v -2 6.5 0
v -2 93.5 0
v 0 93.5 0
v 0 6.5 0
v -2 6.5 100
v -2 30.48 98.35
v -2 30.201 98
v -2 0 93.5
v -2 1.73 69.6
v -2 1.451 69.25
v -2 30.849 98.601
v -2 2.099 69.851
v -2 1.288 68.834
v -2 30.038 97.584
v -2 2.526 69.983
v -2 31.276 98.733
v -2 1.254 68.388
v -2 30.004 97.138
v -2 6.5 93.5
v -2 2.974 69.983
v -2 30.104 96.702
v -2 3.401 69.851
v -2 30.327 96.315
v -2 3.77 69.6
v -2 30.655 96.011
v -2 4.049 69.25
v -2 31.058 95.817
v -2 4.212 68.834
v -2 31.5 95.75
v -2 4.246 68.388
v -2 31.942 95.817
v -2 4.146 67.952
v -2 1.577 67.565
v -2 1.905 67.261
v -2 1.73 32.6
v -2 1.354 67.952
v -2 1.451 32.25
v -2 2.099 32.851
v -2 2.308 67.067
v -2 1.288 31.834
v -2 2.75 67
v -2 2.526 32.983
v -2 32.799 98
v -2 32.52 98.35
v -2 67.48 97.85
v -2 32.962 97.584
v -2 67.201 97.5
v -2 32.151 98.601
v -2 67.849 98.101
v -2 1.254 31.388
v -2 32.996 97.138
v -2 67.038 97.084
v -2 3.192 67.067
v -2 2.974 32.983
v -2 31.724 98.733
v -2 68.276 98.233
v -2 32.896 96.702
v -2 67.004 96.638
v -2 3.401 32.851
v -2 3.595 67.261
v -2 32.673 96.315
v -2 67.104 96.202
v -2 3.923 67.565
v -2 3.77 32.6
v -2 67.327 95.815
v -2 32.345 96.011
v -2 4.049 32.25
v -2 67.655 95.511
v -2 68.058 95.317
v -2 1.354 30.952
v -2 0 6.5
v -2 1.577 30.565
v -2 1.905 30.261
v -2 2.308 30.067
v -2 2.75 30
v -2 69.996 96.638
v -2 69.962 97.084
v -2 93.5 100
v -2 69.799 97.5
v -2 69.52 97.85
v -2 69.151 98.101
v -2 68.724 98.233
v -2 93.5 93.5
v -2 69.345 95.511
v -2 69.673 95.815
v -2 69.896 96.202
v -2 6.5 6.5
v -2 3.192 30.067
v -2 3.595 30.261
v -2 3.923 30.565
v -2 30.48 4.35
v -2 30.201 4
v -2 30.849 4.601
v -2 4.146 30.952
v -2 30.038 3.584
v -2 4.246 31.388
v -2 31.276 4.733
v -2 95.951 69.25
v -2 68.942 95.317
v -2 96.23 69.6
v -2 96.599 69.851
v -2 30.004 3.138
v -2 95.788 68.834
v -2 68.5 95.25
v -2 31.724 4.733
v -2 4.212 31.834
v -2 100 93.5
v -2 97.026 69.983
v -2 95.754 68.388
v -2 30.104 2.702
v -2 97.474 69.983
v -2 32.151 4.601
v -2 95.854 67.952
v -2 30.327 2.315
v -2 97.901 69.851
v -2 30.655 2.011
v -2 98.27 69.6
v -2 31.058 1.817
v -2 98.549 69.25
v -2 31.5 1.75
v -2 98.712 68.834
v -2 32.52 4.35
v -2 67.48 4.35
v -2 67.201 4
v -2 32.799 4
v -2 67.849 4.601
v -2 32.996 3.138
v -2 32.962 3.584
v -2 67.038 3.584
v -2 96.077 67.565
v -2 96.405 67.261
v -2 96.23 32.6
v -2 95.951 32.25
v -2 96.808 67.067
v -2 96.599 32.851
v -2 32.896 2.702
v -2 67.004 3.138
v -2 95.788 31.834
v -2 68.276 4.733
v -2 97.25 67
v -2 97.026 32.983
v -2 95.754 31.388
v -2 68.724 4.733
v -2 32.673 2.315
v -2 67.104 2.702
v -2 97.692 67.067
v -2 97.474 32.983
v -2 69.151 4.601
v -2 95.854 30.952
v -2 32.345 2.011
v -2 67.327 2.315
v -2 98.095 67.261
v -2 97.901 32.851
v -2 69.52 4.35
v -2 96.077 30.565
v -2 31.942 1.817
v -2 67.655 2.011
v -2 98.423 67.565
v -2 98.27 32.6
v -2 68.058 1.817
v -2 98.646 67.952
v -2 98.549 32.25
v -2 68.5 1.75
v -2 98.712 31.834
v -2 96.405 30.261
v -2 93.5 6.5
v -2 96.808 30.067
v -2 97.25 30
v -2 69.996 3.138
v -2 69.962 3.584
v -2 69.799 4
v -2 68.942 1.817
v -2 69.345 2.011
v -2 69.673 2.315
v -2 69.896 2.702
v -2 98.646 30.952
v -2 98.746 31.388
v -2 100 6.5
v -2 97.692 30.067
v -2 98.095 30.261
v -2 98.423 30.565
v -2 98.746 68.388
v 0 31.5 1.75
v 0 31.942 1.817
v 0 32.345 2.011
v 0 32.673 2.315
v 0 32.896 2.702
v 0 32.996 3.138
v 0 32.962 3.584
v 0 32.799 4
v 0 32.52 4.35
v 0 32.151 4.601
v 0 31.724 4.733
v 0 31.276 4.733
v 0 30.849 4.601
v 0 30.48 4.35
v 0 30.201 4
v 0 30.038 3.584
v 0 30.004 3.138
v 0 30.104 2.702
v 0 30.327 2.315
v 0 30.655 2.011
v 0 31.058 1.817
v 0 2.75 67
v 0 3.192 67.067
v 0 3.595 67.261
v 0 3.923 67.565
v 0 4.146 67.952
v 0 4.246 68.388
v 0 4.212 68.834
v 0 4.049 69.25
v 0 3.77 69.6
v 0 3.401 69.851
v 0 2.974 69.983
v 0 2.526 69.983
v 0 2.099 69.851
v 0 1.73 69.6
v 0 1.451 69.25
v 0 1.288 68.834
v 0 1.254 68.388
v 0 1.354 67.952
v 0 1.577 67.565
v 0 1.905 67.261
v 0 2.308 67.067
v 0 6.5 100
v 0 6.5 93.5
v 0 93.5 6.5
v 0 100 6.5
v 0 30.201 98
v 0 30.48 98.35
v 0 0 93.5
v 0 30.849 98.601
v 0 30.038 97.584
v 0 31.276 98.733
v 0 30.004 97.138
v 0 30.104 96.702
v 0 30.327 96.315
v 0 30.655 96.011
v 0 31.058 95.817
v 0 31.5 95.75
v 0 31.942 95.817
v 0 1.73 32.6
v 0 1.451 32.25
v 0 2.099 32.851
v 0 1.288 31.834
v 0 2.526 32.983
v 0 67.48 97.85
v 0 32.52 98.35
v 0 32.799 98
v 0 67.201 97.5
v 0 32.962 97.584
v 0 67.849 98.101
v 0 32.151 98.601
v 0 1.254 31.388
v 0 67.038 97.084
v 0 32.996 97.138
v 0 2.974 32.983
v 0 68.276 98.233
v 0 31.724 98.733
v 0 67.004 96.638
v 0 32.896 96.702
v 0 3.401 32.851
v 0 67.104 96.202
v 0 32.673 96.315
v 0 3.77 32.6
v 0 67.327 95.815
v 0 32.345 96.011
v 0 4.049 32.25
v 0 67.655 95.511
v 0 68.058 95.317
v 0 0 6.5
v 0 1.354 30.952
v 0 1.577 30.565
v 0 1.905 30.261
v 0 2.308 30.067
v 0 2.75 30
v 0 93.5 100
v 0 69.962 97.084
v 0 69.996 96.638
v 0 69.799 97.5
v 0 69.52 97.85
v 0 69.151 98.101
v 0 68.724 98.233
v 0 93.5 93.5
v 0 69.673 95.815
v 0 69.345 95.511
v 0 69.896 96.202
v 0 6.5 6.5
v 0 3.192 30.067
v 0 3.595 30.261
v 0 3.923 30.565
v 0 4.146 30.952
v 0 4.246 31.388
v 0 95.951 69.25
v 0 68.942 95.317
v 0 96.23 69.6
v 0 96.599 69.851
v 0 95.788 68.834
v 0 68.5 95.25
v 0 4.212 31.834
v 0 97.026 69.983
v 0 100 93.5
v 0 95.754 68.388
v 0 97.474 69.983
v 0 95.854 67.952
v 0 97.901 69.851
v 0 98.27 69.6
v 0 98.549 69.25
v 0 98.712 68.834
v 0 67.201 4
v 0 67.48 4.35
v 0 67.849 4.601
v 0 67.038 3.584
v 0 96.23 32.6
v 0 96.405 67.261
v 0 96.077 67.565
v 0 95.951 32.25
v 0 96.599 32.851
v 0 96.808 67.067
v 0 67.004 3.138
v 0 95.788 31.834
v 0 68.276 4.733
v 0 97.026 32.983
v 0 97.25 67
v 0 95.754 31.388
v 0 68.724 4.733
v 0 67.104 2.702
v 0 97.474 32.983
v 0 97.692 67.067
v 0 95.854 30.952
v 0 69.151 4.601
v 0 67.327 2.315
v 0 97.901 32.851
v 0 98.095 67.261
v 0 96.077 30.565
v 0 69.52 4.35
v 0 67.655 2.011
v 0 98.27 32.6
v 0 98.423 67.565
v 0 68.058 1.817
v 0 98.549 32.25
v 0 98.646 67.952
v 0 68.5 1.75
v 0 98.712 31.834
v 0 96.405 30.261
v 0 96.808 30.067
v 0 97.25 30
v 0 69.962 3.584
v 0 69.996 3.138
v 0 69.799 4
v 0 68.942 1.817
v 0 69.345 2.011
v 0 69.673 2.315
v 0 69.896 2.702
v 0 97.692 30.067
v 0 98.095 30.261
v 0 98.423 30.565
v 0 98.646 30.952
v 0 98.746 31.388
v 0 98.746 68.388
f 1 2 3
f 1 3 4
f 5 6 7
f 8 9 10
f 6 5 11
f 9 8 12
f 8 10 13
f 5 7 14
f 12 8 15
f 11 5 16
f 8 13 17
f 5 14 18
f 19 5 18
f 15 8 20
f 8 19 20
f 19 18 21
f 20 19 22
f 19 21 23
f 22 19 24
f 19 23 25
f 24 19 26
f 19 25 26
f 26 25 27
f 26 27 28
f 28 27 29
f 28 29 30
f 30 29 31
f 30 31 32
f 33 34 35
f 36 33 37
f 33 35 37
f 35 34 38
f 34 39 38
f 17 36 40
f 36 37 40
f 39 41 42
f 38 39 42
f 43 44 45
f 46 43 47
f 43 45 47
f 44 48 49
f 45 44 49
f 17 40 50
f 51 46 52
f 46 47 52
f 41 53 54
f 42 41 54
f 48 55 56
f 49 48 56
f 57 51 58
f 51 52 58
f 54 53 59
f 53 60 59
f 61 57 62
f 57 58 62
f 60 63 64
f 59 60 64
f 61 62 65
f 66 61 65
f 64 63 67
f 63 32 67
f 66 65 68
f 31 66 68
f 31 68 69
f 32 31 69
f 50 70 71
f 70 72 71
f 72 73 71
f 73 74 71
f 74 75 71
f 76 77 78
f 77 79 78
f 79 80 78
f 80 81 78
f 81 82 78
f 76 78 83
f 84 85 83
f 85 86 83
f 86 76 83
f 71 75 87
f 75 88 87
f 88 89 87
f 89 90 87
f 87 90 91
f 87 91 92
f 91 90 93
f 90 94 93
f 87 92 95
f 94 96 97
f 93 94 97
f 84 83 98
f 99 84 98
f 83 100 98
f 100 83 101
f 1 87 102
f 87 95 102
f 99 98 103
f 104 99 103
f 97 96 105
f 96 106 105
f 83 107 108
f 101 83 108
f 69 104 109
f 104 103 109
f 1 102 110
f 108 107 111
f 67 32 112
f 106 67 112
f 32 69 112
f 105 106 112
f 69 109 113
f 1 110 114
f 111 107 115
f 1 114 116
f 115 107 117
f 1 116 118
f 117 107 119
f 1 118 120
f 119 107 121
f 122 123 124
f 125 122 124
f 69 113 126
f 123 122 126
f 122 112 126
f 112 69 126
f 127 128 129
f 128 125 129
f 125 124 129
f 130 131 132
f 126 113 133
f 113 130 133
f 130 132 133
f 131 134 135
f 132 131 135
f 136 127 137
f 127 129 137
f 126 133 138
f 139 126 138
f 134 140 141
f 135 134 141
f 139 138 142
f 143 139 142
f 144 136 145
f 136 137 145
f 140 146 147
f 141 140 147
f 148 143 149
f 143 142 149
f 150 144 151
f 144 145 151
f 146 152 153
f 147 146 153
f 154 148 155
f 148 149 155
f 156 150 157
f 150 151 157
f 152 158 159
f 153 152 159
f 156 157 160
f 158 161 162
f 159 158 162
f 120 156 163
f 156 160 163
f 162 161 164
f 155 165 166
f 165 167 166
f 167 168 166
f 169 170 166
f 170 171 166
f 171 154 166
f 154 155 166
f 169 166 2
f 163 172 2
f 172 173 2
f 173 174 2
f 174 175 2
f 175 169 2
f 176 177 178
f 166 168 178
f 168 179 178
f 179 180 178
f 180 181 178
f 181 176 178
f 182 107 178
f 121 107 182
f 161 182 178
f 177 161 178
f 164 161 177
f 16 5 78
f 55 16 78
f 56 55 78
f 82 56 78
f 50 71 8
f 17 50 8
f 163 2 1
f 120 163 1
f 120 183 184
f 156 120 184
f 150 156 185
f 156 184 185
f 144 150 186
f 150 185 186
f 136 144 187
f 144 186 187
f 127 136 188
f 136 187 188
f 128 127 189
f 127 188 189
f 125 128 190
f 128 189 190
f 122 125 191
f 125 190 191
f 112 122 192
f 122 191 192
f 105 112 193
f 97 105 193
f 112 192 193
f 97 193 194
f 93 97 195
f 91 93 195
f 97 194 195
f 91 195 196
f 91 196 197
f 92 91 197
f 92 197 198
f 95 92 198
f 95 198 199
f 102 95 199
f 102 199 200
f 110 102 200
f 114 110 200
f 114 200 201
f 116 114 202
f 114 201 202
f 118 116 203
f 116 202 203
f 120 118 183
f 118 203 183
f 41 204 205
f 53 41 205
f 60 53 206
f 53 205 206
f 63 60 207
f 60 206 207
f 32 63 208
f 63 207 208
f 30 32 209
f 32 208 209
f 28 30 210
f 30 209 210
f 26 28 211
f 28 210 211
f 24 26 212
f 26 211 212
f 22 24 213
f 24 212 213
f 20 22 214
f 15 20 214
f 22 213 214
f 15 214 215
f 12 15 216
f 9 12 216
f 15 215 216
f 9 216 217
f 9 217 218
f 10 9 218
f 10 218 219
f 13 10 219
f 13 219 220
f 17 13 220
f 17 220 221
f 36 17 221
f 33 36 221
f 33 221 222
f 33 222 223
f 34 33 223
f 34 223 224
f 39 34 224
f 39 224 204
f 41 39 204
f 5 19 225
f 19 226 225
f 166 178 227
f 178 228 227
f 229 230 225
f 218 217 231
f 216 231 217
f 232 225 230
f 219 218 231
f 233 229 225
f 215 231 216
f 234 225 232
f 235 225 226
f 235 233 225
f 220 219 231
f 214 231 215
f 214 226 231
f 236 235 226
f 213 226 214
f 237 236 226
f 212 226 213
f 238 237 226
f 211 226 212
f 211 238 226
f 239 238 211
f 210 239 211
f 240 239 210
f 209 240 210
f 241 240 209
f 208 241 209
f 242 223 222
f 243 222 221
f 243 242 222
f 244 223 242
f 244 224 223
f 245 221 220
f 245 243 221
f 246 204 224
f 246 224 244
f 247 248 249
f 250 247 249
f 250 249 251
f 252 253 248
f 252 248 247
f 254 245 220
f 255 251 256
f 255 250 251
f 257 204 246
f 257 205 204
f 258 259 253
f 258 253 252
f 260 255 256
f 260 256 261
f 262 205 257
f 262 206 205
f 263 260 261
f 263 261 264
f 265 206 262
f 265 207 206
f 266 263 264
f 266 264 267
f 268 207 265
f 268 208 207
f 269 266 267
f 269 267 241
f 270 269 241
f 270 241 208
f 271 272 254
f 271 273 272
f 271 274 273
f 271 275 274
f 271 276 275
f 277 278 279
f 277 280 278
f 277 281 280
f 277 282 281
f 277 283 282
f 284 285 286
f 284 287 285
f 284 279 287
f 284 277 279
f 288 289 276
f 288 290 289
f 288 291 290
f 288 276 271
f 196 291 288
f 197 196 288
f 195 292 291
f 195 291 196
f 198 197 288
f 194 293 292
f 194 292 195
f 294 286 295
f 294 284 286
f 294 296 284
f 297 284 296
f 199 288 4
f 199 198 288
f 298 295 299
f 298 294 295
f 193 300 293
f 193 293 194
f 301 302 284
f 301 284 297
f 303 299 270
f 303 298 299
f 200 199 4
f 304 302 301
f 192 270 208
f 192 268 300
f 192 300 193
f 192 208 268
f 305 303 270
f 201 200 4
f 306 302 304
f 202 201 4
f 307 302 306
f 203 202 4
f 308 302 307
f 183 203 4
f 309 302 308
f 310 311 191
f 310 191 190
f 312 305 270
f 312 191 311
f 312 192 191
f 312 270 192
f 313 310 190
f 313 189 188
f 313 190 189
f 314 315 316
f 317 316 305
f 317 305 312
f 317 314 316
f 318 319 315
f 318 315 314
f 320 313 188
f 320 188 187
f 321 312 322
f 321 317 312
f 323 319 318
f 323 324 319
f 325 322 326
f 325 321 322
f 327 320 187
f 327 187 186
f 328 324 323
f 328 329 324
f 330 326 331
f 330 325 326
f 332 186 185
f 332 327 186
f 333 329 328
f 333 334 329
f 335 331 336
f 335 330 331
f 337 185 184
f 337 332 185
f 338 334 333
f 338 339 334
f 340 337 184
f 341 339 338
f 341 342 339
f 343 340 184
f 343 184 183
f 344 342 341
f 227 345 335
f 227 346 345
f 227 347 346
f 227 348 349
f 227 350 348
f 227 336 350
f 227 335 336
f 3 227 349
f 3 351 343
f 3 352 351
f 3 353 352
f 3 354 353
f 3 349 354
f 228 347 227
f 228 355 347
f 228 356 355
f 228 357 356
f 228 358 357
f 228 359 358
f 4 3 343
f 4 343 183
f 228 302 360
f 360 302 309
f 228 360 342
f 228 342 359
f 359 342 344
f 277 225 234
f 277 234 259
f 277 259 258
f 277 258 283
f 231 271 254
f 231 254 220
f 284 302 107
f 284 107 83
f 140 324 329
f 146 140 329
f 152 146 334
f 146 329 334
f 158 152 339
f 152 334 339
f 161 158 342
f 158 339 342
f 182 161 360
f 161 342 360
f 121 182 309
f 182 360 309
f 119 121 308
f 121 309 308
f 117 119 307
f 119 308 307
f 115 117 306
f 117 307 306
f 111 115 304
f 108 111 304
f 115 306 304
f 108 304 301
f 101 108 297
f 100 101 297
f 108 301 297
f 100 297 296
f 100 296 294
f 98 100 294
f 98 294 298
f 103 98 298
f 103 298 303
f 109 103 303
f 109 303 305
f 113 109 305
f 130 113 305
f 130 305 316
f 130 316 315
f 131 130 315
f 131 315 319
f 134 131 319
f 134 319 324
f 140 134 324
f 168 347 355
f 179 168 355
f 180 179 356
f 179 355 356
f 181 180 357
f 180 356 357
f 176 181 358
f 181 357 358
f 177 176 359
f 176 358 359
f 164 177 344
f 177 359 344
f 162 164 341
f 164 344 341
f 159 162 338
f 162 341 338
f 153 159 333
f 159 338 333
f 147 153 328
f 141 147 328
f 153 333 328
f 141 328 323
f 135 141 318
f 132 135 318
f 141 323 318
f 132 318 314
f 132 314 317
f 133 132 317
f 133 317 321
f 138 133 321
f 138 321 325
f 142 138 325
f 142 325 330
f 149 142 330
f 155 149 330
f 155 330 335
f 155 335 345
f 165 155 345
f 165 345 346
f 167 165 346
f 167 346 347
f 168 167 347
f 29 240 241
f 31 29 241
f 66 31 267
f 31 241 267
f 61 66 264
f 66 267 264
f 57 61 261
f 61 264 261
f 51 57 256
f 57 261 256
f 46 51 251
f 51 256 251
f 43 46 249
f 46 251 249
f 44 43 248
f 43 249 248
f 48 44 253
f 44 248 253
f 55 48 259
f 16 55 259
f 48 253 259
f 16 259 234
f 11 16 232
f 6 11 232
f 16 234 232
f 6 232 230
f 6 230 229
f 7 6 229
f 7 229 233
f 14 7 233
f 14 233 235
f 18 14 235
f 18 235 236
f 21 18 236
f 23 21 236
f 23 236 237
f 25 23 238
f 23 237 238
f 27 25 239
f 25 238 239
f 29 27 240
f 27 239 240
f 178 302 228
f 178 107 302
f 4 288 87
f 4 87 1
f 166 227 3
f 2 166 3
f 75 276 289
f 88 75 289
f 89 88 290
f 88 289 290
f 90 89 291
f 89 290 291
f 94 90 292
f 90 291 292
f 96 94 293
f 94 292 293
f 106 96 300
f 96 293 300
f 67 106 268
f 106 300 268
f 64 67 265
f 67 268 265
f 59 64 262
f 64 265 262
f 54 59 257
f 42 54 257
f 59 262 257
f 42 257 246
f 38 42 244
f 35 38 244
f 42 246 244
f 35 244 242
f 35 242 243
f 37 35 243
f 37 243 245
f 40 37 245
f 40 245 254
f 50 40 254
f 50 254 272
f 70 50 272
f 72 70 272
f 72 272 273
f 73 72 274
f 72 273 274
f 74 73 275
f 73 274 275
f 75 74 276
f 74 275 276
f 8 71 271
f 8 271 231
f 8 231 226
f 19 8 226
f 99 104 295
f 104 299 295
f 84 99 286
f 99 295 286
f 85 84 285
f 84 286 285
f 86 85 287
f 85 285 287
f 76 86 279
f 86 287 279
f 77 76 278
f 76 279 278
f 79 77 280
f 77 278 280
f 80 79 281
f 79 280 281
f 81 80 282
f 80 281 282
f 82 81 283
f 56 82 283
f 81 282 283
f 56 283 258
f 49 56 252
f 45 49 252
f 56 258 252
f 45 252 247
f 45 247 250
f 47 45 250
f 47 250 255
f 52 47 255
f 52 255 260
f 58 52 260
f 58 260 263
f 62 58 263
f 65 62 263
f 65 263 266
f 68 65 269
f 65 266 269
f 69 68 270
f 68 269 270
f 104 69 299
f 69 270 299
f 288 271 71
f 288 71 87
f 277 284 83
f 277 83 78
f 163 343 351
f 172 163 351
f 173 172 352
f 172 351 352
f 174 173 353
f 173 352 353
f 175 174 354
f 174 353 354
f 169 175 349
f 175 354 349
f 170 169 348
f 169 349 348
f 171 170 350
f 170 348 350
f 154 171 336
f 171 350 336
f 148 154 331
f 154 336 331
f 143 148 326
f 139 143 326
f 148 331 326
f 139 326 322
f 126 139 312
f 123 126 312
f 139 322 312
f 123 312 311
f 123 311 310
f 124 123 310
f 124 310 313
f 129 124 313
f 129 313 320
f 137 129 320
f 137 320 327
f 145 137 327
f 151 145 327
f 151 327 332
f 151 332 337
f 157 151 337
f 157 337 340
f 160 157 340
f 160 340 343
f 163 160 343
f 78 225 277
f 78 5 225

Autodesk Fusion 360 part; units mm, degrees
sketch "Sketch1" plane through (0, 0, 0) normal (1, 0, 0) x (0, 0, -1)
  line L0 (0, 0) -> (-100, 0)
  line L1 (-100, 0) -> (-100, 100)
  line L2 (-100, 100) -> (0, 100)
  line L3 (0, 100) -> (0, 0)
  dimension "d1" = 100
  dimension "d2" = 100
extrude "Extrude1" add sketch "Sketch1" against normal blind 2
extrude "Extrude2" add 1 faces at (0, 33.3333, 33.3333) along direction (1, 0, 0) blind 2
extrude "Extrude3" add 1 faces at (2, 33.3333, 33.3333) along direction (1, 0, 0) blind 1
sketch "Sketch2" plane through (3, 0, 0) normal (1, 0, 0) x (0, 0, -1)
  line L0 (-100, 100) -> (0, 100)
  line L1 (0, 100) -> (0, 0)
  line L2 (0, 0) -> (-100, 0)
  line L3 (-100, 0) -> (-100, 100)
  line L4 (-100, 100) -> (-68.5, 100)
  line L5 (-68.5, 100) -> (-68.5, 94.5)
  line L6 (-68.5, 94.5) -> (-100, 94.5)
  line L7 (-100, 94.5) -> (-100, 100)
  line L8 (-100, 100) -> (-93.5, 100)
  line L9 (-93.5, 100) -> (-93.5, 68.5)
  line L10 (0, 100) -> (-6.5, 100)
  line L11 (-6.5, 100) -> (-6.5, 68.5)
  line L12 (-6.5, 68.5) -> (0, 68.5)
  line L13 (0, 68.5) -> (0, 100)
  line L14 (0, 100) -> (-31.5, 100)
  line L15 (-31.5, 100) -> (-31.5, 94.5)
  line L16 (-31.5, 94.5) -> (0, 94.5)
  line L17 (0, 94.5) -> (0, 100)
  line L18 (0, 0) -> (-6.5, 0)
  line L19 (-6.5, 0) -> (-6.5, 31.5)
  line L20 (-6.5, 31.5) -> (0, 31.5)
  line L21 (0, 31.5) -> (0, 0)
  line L22 (0, 0) -> (-31.5, 0)
  line L23 (-31.5, 0) -> (-31.5, 5.5)
  line L24 (-31.5, 5.5) -> (0, 5.5)
  line L25 (0, 5.5) -> (0, 0)
  line L26 (-100, 0) -> (-68.5, 0)
  line L27 (-68.5, 0) -> (-68.5, 5.5)
  line L28 (-68.5, 5.5) -> (-100, 5.5)
  line L29 (-100, 5.5) -> (-100, 0)
  line L30 (-100, 0) -> (-94.5, 0)
  line L31 (-94.5, 0) -> (-94.5, 31.5)
  line L32 (-94.5, 31.5) -> (-100, 31.5)
  line L33 (-100, 31.5) -> (-100, 0)
  circle A0 centre (-68.5, 97.25) radius 1.5
  circle A1 centre (-97.25, 31.5) radius 1.5
  circle A2 centre (-68.5, 2.75) radius 1.5
  circle A3 centre (-31.5, 2.75) radius 1.5
  circle A4 centre (-3.25, 31.5) radius 1.5
  circle A5 centre (-3.25, 68.5) radius 1.5
  circle A6 centre (-31.5, 97.25) radius 1.5
  line L34 (-93.5, 68.5) -> (-100, 68.5)
  line L35 (-100, 68.5) -> (-100, 100)
  line L36 (-100, 100) -> (-93.5, 100)
  line L37 (-93.5, 100) -> (-93.5, 68.5)
  circle A7 centre (-96.75, 68.5) radius 1.5
  line L38 (-100, 100) -> (-93.5, 100)
  line L39 (-93.5, 100) -> (-93.5, 93.5)
  line L40 (-93.5, 93.5) -> (-100, 93.5)
  line L41 (-100, 93.5) -> (-100, 100)
  line L42 (-100, 0) -> (-93.5, 0)
  line L43 (-93.5, 0) -> (-93.5, 6.5)
  line L44 (-93.5, 6.5) -> (-100, 6.5)
  line L45 (-100, 6.5) -> (-100, 0)
  line L46 (0, 0) -> (-6.5, 0)
  line L47 (-6.5, 0) -> (-6.5, 6.5)
  line L48 (-6.5, 6.5) -> (0, 6.5)
  line L49 (0, 6.5) -> (0, 0)
  line L50 (0, 100) -> (-6.5, 100)
  line L51 (-6.5, 100) -> (-6.5, 93.5)
  line L52 (-6.5, 93.5) -> (0, 93.5)
  line L53 (0, 93.5) -> (0, 100)
  dimension "d53" = 31.5
  dimension "d54" = 5.5
  dimension "d55" = 6.5
  dimension "d57" = 6.5
  dimension "d58" = 31.5
  dimension "d59" = 31.5
  dimension "d60" = 5.5
  dimension "d61" = 6.5
  dimension "d62" = 31.5
  dimension "d63" = 5.5
  dimension "d64" = 31.5
  dimension "d65" = 5.5
  dimension "d66" = 31.5
  dimension "d67" = 100
  dimension "d68" = 100
  dimension "d69" = 5.5
  dimension "d70" = 31.5
  dimension "d71" = 3
  dimension "d73" = 3
  dimension "d74" = 3
  dimension "d75" = 3
  dimension "d76" = 3
  dimension "d77" = 3
  dimension "d78" = 3
  dimension "d81" = 31.5
  dimension "d83" = 3
  dimension "d88" = 6.5
  dimension "d89" = 6.5
  dimension "d90" = 6.5
  dimension "d91" = 6.5
  dimension "d92" = 6.5
  dimension "d93" = 6.5
  dimension "d94" = 6.5
  dimension "d95" = 6.5
extrude "Extrude9" cut sketch "Sketch2" against normal blind 20 contours L5 A0 | L5 A0 | L15 A6 | L15 A6 | L34 A7 | L34 A7 | L32 A1 | L32 A1 | L12 A5 | L12 A5 | L20 A4 | L20 A4 | L27 A2 | L27 A2 | L23 A3 | L23 A3
extrude "Extrude10" cut sketch "Sketch2" against normal blind 3 contours L0 L3 L4 L6 L7 L8 L9 L35 L36 L37 L38 L39 L41 | L0 L4 L5 L6 L9 A0 L37 L39 | L3 L6 L9 L35 L37 L39 L40 L41 | L0 L1 L2 L3 L5 L6 L9 L11 L12 L15 L16 L19 L20 L23 L24 L27 L28 L31 L32 A0 A1 A2 A3 A4 A5 A6 L34 L37 A7 L39 L43 L44 L47 L51 | L3 L9 L34 L35 L37 A7 L40 | L0 L11 L14 L15 L16 A6 L51 | L0 L1 L10 L11 L13 L14 L16 L17 L50 L51 L53 | L3 L31 L32 L33 A1 L44 | L1 L11 L13 L16 L51 L52 L53 | L3 L28 L31 L33 L44 L45 | L1 L11 L12 L13 A5 L52 | L2 L3 L26 L28 L29 L30 L31 L33 L42 L45 | L28 L31 L43 L44 | L2 L26 L28 L31 L42 L43 | L2 L26 L27 L28 A2 L43 | L1 L19 L20 L21 A4 L48 | L1 L19 L21 L24 L47 L48 L49 | L1 L2 L18 L19 L21 L22 L24 L25 L46 L47 L49 | L2 L19 L22 L23 L24 A3 L47
extrude "Extrude11" cut sketch "Sketch2" against normal blind 70 contours L0 L3 L4 L6 L7 L8 L9 L35 L36 L37 L38 L39 L41 | L3 L6 L9 L35 L37 L39 L40 L41 | L0 L1 L10 L11 L13 L14 L16 L17 L50 L51 L53 | L1 L11 L13 L16 L51 L52 L53 | L3 L28 L31 L33 L44 L45 | L2 L3 L26 L28 L29 L30 L31 L33 L42 L45 | L28 L31 L43 L44 | L2 L26 L28 L31 L42 L43 | L1 L19 L21 L24 L47 L48 L49 | L1 L2 L18 L19 L21 L22 L24 L25 L46 L47 L49
